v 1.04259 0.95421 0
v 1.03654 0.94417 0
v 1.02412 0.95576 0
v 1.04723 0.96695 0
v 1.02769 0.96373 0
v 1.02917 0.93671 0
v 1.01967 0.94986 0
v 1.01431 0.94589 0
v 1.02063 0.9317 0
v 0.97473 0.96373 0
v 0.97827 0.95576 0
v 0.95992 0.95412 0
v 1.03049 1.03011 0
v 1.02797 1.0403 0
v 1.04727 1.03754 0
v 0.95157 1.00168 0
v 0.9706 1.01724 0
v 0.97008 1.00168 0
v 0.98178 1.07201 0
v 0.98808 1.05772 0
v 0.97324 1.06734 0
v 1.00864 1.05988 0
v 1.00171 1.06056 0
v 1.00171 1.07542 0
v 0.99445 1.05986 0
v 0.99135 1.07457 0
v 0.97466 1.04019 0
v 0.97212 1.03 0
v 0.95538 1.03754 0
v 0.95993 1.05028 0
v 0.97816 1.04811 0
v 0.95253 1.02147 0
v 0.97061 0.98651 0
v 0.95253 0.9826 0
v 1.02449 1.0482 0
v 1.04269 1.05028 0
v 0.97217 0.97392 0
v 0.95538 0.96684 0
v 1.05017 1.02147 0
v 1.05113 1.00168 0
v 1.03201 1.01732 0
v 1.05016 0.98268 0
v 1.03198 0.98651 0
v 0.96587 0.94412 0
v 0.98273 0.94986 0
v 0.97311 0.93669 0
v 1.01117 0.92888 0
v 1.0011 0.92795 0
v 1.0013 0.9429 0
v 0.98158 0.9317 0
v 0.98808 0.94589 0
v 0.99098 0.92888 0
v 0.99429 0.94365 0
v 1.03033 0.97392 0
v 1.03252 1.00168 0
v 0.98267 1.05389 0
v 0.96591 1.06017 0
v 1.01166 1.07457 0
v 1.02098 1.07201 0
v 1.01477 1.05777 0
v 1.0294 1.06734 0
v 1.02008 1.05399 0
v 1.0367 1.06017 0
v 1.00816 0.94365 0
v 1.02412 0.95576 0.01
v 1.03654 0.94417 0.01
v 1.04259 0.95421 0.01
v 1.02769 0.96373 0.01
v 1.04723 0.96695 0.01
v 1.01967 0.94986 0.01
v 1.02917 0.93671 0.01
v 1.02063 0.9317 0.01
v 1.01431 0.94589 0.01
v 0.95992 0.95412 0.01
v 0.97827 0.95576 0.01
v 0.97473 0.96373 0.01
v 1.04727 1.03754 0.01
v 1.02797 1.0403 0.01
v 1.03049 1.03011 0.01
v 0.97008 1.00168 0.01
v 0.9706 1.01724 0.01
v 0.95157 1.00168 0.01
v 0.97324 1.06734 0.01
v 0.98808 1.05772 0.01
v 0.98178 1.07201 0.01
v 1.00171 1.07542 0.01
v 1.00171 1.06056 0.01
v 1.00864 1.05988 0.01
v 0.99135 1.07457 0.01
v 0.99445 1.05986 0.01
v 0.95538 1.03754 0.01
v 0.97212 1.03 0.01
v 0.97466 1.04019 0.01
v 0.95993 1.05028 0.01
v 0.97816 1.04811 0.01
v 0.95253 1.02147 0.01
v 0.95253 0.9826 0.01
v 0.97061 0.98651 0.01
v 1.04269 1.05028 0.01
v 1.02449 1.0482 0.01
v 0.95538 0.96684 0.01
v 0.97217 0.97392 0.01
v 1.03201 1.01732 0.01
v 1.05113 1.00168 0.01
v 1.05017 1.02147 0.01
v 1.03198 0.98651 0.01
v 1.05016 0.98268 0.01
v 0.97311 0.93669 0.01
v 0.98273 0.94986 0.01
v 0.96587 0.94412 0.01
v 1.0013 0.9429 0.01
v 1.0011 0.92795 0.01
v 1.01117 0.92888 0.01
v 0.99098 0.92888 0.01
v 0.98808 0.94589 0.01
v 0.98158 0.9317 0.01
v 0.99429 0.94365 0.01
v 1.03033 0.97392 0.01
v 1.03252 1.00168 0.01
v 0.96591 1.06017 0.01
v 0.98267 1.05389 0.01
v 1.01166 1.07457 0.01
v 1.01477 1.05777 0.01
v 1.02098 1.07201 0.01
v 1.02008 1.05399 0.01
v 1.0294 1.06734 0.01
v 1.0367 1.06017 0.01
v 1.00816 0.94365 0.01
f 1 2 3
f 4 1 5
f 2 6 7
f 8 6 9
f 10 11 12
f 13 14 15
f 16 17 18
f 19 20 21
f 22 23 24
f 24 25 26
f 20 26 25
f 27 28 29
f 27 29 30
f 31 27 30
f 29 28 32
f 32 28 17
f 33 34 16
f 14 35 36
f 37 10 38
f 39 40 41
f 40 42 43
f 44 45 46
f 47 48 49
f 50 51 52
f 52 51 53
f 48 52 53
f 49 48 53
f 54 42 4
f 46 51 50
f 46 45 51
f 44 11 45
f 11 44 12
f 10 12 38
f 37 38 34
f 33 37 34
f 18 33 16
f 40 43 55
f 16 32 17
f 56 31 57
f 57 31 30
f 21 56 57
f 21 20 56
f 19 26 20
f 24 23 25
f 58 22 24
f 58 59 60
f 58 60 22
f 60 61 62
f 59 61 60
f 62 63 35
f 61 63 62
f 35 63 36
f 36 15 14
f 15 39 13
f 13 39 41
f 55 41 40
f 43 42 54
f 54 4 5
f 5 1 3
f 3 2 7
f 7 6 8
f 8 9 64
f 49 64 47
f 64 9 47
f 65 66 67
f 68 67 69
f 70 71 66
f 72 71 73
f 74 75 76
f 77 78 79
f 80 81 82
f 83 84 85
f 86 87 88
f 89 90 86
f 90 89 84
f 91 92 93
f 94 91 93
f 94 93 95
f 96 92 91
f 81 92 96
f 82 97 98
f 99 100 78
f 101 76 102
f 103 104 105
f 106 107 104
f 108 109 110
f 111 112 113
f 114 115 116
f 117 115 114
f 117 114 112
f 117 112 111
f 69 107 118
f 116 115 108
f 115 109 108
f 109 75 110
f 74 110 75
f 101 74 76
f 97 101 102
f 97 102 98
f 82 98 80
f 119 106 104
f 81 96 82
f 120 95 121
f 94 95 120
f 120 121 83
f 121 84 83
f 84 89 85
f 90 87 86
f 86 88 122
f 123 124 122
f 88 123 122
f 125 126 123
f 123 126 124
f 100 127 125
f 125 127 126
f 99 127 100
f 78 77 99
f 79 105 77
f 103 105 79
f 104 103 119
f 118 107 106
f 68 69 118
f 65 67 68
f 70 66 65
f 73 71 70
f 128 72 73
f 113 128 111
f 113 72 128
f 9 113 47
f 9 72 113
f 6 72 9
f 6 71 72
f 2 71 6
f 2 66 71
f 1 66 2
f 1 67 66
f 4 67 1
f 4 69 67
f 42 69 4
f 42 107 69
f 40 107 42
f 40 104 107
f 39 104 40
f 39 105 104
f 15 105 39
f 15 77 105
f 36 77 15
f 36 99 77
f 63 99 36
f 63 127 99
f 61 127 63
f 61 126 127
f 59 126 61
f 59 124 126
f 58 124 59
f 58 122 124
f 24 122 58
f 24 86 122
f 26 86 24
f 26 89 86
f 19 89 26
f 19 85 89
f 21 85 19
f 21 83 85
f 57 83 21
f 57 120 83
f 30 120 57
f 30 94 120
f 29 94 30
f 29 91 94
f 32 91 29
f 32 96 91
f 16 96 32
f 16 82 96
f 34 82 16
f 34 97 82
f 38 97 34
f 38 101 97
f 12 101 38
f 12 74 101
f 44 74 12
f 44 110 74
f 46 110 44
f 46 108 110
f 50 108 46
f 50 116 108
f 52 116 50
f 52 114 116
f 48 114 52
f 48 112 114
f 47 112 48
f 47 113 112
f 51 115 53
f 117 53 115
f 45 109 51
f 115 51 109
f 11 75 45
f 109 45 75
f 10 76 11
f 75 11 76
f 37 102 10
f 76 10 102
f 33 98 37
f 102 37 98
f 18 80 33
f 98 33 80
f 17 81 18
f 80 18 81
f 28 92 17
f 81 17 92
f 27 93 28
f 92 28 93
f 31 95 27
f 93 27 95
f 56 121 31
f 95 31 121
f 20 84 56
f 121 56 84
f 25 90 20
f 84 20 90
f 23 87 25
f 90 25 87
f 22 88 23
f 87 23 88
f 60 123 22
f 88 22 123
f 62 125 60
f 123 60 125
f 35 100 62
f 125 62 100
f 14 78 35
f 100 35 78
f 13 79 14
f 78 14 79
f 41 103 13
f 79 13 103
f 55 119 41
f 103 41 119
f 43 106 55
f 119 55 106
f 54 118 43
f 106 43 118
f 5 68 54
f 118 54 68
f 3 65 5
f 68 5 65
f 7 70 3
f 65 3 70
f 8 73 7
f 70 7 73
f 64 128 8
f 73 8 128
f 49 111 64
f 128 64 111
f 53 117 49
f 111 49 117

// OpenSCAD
translate([1, 1, 0]) linear_extrude(0.01) text("0",size=0.15, halign="center", valign="center");
